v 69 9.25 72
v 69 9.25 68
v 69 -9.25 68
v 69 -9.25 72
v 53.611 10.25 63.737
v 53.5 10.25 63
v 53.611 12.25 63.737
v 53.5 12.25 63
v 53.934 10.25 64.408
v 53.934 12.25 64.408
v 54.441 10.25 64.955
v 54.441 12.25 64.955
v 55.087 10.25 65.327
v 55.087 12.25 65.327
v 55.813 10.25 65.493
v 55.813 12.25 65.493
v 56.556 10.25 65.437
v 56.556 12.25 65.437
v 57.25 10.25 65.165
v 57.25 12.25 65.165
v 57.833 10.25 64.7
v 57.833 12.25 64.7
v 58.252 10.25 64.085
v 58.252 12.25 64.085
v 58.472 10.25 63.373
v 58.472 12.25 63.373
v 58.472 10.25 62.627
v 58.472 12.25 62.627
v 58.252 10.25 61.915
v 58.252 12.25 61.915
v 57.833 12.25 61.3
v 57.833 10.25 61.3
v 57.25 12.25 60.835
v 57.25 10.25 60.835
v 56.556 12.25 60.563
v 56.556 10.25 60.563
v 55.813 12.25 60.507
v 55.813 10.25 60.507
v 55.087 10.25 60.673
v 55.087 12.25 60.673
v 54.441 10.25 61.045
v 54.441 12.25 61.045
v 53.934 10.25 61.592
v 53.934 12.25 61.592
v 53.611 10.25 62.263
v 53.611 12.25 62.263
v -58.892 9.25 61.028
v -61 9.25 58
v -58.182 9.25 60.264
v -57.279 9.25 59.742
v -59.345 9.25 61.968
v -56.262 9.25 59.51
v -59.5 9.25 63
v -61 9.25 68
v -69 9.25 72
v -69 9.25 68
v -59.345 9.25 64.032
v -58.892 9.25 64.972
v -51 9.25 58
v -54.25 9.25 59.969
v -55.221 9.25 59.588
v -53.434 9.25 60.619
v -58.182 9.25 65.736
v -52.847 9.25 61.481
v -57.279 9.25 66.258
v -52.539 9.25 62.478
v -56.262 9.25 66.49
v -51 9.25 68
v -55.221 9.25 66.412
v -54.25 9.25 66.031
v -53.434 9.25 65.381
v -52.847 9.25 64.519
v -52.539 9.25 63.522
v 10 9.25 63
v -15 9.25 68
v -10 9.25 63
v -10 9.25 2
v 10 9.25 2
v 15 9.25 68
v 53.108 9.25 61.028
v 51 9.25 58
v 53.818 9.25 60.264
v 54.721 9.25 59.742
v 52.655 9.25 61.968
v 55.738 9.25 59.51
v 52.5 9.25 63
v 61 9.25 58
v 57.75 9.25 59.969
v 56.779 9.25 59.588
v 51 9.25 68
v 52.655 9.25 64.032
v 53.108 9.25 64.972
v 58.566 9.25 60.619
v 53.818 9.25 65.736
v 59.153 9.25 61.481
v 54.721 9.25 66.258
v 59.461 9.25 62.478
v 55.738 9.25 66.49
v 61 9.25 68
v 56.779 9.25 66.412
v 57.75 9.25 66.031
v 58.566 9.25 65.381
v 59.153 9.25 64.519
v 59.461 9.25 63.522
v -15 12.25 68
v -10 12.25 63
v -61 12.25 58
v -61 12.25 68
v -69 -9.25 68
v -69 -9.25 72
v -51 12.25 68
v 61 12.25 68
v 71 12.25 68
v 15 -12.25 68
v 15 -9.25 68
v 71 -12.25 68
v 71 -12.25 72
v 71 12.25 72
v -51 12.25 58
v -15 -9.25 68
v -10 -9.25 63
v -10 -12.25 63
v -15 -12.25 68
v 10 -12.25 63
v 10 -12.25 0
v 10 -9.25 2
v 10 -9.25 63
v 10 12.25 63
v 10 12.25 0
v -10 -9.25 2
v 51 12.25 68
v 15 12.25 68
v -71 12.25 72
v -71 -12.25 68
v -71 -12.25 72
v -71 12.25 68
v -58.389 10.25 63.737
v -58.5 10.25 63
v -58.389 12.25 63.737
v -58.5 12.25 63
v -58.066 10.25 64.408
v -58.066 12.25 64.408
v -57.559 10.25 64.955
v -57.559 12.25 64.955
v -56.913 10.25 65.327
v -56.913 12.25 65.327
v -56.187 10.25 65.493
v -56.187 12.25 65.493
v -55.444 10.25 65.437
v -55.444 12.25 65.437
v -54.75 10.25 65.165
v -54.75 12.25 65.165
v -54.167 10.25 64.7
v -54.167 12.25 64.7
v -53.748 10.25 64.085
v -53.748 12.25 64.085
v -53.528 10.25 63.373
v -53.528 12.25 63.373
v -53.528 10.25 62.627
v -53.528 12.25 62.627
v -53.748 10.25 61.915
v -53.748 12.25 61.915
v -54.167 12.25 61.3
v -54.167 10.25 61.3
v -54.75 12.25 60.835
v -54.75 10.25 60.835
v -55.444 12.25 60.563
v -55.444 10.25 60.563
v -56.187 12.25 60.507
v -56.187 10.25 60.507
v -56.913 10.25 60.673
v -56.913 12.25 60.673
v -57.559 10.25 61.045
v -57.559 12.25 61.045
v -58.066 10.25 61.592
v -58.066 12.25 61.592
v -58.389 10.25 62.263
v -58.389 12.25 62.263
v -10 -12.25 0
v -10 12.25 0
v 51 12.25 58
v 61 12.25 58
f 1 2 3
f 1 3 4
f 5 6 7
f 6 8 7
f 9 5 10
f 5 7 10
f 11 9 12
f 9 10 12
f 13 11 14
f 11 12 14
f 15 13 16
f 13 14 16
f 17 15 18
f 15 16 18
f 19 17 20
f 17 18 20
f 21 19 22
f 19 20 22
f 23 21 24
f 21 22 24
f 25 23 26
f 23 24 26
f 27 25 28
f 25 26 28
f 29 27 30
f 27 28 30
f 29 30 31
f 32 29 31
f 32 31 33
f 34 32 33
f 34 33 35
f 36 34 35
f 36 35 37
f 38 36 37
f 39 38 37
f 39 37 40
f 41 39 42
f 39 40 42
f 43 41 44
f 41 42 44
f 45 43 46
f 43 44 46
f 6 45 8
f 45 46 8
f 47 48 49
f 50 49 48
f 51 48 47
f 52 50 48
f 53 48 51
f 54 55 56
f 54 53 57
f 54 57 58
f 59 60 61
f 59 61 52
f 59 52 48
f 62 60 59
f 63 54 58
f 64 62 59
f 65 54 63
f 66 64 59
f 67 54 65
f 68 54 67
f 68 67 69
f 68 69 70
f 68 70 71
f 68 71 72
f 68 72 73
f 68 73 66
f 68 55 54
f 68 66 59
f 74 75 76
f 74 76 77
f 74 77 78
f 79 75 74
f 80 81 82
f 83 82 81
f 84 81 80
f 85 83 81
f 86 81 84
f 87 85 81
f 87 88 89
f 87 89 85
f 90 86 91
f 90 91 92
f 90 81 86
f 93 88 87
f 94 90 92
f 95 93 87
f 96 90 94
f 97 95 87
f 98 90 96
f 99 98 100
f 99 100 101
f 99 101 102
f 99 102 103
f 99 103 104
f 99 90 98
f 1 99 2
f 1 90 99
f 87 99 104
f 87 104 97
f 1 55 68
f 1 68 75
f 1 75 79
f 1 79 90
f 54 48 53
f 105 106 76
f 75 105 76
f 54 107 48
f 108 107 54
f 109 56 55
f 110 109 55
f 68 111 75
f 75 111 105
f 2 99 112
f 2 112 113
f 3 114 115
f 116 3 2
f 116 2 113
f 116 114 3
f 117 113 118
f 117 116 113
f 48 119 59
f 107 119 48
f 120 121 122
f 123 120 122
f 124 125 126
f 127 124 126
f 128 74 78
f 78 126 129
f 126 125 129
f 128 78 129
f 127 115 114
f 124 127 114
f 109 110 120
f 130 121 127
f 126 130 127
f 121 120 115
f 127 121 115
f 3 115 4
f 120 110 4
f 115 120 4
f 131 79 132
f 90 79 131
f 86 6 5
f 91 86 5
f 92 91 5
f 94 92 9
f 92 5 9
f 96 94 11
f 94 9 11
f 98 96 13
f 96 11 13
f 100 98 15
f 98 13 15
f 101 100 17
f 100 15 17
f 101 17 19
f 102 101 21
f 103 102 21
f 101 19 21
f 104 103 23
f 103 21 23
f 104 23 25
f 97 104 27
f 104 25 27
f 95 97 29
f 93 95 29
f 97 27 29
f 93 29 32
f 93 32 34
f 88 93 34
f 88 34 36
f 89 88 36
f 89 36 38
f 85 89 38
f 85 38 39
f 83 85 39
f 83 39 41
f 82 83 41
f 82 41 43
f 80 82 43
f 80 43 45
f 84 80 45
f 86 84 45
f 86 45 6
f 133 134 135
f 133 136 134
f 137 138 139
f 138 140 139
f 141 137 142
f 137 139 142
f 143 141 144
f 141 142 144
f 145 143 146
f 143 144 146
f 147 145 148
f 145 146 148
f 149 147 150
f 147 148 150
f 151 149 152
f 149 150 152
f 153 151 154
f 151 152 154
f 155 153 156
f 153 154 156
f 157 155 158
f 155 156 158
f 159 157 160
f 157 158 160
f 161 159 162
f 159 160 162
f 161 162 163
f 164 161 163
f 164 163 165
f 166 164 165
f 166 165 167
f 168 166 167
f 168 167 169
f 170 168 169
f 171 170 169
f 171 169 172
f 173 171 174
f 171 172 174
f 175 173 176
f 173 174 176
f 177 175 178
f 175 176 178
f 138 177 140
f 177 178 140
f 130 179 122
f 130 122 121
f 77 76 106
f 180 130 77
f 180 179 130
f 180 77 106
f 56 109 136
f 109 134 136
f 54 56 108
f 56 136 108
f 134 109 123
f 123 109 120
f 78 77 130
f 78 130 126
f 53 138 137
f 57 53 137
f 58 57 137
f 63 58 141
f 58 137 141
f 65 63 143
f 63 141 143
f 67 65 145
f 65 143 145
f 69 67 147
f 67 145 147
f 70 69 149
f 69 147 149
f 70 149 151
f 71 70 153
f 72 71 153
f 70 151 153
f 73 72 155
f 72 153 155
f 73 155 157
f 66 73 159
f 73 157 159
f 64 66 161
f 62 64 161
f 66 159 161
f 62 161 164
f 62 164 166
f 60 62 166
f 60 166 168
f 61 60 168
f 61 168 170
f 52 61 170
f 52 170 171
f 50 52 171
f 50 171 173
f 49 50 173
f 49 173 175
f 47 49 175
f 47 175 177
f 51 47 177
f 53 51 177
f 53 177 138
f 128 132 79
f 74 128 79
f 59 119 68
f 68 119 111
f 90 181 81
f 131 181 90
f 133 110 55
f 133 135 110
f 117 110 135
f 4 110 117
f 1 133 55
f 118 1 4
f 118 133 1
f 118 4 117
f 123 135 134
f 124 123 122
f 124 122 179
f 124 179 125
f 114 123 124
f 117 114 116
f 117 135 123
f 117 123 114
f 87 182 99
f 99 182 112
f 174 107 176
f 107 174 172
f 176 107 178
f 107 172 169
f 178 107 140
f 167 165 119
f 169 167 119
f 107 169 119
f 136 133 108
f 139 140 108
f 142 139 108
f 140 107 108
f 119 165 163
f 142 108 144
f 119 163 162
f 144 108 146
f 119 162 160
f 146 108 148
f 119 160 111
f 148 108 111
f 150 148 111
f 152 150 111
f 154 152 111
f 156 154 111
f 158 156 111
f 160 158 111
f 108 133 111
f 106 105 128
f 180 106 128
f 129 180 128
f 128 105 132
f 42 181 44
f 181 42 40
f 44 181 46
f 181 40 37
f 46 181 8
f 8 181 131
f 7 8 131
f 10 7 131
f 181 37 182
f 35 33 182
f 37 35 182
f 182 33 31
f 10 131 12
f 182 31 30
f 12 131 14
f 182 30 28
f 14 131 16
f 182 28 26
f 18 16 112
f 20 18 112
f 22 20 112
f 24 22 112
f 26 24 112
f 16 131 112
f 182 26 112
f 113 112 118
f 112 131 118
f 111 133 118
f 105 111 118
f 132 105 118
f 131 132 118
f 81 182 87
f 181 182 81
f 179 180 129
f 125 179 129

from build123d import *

# Parameters (mm, degrees)
F0_W            = 20
F0_H            = 24.5
F1_DEPTH        = 2
F2_W            = 20
F2_H            = 3
F3_DEPTH        = 70
F4_W            = 71
F4_H            = 4
F5_DEPTH        = 3
F6_W            = 71
F6_H            = 4
F7_DEPTH        = 3
F8_W            = 2
F8_H            = 4
F9_DEPTH        = 18.5
F10_SIZE        = 5
F11_W           = 10
F11_H           = 10
F12_DEPTH       = 3
F14_D           = 5
F14_CSINK_D     = 7
F14_CSINK_ANGLE = 90


with BuildPart() as f1:
    # F0 (on Top) → F1 (new body)
    with BuildSketch(Plane.XY):
        Rectangle(F0_W, F0_H)
    extrude(amount=F1_DEPTH)

    # F2 (on face) → F3 (join)
    with BuildSketch(Plane.XY.offset(2)):
        with Locations((0, 10.75)):
            Rectangle(F2_W, F2_H)
        with Locations((0, -10.75)):
            Rectangle(F2_W, F2_H)
    extrude(amount=F3_DEPTH)

    # F4 (on face) → F5 (join, through all)
    with BuildSketch(Plane.XZ.offset(12.25)):
        with Locations((35.5, 70)):
            Rectangle(F4_W, F4_H)
        with Locations((-35.5, 70)):
            Rectangle(F4_W, F4_H)
    extrude(amount=-F5_DEPTH)

    # F6 (on face) → F7 (join, through all)
    with BuildSketch(Plane.XZ.offset(-9.25)):
        with Locations((-35.5, 70)):
            Rectangle(F6_W, F6_H)
        with Locations((35.5, 70)):
            Rectangle(F6_W, F6_H)
    extrude(amount=-F7_DEPTH)

    # F8 (on face) → F9 (join, through all)
    with BuildSketch(Plane.XZ.offset(-9.25)):
        with Locations((-70, 70)):
            Rectangle(F8_W, F8_H)
        with Locations((70, 70)):
            Rectangle(F8_W, F8_H)
    extrude(amount=F9_DEPTH)

    # F10
    f10_edges = [f1.edges().sort_by_distance(p)[0] for p in [
        (10, 10.75, 68),
        (10, -10.75, 68),
        (-10, 10.75, 68),
        (-10, -10.75, 68),
    ]]
    chamfer(f10_edges, length=F10_SIZE)

    # F11 (on face) → F12 (join, through all)
    with BuildSketch(Plane(origin=(0, 12.25, 0), x_dir=(-1, 0, 0), z_dir=(0, 1, 0))):
        with Locations((-56, 63)):
            Rectangle(F11_W, F11_H)
        with Locations((56, 63)):
            Rectangle(F11_W, F11_H)
    extrude(amount=-F12_DEPTH)

    # F14 (through all)
    with Locations(Plane.XZ.offset(-9.25)):
        with Locations((56, 63), (-56, 63)):
            CounterSinkHole(F14_D / 2, F14_CSINK_D / 2, counter_sink_angle=F14_CSINK_ANGLE)


solid = f1.part
